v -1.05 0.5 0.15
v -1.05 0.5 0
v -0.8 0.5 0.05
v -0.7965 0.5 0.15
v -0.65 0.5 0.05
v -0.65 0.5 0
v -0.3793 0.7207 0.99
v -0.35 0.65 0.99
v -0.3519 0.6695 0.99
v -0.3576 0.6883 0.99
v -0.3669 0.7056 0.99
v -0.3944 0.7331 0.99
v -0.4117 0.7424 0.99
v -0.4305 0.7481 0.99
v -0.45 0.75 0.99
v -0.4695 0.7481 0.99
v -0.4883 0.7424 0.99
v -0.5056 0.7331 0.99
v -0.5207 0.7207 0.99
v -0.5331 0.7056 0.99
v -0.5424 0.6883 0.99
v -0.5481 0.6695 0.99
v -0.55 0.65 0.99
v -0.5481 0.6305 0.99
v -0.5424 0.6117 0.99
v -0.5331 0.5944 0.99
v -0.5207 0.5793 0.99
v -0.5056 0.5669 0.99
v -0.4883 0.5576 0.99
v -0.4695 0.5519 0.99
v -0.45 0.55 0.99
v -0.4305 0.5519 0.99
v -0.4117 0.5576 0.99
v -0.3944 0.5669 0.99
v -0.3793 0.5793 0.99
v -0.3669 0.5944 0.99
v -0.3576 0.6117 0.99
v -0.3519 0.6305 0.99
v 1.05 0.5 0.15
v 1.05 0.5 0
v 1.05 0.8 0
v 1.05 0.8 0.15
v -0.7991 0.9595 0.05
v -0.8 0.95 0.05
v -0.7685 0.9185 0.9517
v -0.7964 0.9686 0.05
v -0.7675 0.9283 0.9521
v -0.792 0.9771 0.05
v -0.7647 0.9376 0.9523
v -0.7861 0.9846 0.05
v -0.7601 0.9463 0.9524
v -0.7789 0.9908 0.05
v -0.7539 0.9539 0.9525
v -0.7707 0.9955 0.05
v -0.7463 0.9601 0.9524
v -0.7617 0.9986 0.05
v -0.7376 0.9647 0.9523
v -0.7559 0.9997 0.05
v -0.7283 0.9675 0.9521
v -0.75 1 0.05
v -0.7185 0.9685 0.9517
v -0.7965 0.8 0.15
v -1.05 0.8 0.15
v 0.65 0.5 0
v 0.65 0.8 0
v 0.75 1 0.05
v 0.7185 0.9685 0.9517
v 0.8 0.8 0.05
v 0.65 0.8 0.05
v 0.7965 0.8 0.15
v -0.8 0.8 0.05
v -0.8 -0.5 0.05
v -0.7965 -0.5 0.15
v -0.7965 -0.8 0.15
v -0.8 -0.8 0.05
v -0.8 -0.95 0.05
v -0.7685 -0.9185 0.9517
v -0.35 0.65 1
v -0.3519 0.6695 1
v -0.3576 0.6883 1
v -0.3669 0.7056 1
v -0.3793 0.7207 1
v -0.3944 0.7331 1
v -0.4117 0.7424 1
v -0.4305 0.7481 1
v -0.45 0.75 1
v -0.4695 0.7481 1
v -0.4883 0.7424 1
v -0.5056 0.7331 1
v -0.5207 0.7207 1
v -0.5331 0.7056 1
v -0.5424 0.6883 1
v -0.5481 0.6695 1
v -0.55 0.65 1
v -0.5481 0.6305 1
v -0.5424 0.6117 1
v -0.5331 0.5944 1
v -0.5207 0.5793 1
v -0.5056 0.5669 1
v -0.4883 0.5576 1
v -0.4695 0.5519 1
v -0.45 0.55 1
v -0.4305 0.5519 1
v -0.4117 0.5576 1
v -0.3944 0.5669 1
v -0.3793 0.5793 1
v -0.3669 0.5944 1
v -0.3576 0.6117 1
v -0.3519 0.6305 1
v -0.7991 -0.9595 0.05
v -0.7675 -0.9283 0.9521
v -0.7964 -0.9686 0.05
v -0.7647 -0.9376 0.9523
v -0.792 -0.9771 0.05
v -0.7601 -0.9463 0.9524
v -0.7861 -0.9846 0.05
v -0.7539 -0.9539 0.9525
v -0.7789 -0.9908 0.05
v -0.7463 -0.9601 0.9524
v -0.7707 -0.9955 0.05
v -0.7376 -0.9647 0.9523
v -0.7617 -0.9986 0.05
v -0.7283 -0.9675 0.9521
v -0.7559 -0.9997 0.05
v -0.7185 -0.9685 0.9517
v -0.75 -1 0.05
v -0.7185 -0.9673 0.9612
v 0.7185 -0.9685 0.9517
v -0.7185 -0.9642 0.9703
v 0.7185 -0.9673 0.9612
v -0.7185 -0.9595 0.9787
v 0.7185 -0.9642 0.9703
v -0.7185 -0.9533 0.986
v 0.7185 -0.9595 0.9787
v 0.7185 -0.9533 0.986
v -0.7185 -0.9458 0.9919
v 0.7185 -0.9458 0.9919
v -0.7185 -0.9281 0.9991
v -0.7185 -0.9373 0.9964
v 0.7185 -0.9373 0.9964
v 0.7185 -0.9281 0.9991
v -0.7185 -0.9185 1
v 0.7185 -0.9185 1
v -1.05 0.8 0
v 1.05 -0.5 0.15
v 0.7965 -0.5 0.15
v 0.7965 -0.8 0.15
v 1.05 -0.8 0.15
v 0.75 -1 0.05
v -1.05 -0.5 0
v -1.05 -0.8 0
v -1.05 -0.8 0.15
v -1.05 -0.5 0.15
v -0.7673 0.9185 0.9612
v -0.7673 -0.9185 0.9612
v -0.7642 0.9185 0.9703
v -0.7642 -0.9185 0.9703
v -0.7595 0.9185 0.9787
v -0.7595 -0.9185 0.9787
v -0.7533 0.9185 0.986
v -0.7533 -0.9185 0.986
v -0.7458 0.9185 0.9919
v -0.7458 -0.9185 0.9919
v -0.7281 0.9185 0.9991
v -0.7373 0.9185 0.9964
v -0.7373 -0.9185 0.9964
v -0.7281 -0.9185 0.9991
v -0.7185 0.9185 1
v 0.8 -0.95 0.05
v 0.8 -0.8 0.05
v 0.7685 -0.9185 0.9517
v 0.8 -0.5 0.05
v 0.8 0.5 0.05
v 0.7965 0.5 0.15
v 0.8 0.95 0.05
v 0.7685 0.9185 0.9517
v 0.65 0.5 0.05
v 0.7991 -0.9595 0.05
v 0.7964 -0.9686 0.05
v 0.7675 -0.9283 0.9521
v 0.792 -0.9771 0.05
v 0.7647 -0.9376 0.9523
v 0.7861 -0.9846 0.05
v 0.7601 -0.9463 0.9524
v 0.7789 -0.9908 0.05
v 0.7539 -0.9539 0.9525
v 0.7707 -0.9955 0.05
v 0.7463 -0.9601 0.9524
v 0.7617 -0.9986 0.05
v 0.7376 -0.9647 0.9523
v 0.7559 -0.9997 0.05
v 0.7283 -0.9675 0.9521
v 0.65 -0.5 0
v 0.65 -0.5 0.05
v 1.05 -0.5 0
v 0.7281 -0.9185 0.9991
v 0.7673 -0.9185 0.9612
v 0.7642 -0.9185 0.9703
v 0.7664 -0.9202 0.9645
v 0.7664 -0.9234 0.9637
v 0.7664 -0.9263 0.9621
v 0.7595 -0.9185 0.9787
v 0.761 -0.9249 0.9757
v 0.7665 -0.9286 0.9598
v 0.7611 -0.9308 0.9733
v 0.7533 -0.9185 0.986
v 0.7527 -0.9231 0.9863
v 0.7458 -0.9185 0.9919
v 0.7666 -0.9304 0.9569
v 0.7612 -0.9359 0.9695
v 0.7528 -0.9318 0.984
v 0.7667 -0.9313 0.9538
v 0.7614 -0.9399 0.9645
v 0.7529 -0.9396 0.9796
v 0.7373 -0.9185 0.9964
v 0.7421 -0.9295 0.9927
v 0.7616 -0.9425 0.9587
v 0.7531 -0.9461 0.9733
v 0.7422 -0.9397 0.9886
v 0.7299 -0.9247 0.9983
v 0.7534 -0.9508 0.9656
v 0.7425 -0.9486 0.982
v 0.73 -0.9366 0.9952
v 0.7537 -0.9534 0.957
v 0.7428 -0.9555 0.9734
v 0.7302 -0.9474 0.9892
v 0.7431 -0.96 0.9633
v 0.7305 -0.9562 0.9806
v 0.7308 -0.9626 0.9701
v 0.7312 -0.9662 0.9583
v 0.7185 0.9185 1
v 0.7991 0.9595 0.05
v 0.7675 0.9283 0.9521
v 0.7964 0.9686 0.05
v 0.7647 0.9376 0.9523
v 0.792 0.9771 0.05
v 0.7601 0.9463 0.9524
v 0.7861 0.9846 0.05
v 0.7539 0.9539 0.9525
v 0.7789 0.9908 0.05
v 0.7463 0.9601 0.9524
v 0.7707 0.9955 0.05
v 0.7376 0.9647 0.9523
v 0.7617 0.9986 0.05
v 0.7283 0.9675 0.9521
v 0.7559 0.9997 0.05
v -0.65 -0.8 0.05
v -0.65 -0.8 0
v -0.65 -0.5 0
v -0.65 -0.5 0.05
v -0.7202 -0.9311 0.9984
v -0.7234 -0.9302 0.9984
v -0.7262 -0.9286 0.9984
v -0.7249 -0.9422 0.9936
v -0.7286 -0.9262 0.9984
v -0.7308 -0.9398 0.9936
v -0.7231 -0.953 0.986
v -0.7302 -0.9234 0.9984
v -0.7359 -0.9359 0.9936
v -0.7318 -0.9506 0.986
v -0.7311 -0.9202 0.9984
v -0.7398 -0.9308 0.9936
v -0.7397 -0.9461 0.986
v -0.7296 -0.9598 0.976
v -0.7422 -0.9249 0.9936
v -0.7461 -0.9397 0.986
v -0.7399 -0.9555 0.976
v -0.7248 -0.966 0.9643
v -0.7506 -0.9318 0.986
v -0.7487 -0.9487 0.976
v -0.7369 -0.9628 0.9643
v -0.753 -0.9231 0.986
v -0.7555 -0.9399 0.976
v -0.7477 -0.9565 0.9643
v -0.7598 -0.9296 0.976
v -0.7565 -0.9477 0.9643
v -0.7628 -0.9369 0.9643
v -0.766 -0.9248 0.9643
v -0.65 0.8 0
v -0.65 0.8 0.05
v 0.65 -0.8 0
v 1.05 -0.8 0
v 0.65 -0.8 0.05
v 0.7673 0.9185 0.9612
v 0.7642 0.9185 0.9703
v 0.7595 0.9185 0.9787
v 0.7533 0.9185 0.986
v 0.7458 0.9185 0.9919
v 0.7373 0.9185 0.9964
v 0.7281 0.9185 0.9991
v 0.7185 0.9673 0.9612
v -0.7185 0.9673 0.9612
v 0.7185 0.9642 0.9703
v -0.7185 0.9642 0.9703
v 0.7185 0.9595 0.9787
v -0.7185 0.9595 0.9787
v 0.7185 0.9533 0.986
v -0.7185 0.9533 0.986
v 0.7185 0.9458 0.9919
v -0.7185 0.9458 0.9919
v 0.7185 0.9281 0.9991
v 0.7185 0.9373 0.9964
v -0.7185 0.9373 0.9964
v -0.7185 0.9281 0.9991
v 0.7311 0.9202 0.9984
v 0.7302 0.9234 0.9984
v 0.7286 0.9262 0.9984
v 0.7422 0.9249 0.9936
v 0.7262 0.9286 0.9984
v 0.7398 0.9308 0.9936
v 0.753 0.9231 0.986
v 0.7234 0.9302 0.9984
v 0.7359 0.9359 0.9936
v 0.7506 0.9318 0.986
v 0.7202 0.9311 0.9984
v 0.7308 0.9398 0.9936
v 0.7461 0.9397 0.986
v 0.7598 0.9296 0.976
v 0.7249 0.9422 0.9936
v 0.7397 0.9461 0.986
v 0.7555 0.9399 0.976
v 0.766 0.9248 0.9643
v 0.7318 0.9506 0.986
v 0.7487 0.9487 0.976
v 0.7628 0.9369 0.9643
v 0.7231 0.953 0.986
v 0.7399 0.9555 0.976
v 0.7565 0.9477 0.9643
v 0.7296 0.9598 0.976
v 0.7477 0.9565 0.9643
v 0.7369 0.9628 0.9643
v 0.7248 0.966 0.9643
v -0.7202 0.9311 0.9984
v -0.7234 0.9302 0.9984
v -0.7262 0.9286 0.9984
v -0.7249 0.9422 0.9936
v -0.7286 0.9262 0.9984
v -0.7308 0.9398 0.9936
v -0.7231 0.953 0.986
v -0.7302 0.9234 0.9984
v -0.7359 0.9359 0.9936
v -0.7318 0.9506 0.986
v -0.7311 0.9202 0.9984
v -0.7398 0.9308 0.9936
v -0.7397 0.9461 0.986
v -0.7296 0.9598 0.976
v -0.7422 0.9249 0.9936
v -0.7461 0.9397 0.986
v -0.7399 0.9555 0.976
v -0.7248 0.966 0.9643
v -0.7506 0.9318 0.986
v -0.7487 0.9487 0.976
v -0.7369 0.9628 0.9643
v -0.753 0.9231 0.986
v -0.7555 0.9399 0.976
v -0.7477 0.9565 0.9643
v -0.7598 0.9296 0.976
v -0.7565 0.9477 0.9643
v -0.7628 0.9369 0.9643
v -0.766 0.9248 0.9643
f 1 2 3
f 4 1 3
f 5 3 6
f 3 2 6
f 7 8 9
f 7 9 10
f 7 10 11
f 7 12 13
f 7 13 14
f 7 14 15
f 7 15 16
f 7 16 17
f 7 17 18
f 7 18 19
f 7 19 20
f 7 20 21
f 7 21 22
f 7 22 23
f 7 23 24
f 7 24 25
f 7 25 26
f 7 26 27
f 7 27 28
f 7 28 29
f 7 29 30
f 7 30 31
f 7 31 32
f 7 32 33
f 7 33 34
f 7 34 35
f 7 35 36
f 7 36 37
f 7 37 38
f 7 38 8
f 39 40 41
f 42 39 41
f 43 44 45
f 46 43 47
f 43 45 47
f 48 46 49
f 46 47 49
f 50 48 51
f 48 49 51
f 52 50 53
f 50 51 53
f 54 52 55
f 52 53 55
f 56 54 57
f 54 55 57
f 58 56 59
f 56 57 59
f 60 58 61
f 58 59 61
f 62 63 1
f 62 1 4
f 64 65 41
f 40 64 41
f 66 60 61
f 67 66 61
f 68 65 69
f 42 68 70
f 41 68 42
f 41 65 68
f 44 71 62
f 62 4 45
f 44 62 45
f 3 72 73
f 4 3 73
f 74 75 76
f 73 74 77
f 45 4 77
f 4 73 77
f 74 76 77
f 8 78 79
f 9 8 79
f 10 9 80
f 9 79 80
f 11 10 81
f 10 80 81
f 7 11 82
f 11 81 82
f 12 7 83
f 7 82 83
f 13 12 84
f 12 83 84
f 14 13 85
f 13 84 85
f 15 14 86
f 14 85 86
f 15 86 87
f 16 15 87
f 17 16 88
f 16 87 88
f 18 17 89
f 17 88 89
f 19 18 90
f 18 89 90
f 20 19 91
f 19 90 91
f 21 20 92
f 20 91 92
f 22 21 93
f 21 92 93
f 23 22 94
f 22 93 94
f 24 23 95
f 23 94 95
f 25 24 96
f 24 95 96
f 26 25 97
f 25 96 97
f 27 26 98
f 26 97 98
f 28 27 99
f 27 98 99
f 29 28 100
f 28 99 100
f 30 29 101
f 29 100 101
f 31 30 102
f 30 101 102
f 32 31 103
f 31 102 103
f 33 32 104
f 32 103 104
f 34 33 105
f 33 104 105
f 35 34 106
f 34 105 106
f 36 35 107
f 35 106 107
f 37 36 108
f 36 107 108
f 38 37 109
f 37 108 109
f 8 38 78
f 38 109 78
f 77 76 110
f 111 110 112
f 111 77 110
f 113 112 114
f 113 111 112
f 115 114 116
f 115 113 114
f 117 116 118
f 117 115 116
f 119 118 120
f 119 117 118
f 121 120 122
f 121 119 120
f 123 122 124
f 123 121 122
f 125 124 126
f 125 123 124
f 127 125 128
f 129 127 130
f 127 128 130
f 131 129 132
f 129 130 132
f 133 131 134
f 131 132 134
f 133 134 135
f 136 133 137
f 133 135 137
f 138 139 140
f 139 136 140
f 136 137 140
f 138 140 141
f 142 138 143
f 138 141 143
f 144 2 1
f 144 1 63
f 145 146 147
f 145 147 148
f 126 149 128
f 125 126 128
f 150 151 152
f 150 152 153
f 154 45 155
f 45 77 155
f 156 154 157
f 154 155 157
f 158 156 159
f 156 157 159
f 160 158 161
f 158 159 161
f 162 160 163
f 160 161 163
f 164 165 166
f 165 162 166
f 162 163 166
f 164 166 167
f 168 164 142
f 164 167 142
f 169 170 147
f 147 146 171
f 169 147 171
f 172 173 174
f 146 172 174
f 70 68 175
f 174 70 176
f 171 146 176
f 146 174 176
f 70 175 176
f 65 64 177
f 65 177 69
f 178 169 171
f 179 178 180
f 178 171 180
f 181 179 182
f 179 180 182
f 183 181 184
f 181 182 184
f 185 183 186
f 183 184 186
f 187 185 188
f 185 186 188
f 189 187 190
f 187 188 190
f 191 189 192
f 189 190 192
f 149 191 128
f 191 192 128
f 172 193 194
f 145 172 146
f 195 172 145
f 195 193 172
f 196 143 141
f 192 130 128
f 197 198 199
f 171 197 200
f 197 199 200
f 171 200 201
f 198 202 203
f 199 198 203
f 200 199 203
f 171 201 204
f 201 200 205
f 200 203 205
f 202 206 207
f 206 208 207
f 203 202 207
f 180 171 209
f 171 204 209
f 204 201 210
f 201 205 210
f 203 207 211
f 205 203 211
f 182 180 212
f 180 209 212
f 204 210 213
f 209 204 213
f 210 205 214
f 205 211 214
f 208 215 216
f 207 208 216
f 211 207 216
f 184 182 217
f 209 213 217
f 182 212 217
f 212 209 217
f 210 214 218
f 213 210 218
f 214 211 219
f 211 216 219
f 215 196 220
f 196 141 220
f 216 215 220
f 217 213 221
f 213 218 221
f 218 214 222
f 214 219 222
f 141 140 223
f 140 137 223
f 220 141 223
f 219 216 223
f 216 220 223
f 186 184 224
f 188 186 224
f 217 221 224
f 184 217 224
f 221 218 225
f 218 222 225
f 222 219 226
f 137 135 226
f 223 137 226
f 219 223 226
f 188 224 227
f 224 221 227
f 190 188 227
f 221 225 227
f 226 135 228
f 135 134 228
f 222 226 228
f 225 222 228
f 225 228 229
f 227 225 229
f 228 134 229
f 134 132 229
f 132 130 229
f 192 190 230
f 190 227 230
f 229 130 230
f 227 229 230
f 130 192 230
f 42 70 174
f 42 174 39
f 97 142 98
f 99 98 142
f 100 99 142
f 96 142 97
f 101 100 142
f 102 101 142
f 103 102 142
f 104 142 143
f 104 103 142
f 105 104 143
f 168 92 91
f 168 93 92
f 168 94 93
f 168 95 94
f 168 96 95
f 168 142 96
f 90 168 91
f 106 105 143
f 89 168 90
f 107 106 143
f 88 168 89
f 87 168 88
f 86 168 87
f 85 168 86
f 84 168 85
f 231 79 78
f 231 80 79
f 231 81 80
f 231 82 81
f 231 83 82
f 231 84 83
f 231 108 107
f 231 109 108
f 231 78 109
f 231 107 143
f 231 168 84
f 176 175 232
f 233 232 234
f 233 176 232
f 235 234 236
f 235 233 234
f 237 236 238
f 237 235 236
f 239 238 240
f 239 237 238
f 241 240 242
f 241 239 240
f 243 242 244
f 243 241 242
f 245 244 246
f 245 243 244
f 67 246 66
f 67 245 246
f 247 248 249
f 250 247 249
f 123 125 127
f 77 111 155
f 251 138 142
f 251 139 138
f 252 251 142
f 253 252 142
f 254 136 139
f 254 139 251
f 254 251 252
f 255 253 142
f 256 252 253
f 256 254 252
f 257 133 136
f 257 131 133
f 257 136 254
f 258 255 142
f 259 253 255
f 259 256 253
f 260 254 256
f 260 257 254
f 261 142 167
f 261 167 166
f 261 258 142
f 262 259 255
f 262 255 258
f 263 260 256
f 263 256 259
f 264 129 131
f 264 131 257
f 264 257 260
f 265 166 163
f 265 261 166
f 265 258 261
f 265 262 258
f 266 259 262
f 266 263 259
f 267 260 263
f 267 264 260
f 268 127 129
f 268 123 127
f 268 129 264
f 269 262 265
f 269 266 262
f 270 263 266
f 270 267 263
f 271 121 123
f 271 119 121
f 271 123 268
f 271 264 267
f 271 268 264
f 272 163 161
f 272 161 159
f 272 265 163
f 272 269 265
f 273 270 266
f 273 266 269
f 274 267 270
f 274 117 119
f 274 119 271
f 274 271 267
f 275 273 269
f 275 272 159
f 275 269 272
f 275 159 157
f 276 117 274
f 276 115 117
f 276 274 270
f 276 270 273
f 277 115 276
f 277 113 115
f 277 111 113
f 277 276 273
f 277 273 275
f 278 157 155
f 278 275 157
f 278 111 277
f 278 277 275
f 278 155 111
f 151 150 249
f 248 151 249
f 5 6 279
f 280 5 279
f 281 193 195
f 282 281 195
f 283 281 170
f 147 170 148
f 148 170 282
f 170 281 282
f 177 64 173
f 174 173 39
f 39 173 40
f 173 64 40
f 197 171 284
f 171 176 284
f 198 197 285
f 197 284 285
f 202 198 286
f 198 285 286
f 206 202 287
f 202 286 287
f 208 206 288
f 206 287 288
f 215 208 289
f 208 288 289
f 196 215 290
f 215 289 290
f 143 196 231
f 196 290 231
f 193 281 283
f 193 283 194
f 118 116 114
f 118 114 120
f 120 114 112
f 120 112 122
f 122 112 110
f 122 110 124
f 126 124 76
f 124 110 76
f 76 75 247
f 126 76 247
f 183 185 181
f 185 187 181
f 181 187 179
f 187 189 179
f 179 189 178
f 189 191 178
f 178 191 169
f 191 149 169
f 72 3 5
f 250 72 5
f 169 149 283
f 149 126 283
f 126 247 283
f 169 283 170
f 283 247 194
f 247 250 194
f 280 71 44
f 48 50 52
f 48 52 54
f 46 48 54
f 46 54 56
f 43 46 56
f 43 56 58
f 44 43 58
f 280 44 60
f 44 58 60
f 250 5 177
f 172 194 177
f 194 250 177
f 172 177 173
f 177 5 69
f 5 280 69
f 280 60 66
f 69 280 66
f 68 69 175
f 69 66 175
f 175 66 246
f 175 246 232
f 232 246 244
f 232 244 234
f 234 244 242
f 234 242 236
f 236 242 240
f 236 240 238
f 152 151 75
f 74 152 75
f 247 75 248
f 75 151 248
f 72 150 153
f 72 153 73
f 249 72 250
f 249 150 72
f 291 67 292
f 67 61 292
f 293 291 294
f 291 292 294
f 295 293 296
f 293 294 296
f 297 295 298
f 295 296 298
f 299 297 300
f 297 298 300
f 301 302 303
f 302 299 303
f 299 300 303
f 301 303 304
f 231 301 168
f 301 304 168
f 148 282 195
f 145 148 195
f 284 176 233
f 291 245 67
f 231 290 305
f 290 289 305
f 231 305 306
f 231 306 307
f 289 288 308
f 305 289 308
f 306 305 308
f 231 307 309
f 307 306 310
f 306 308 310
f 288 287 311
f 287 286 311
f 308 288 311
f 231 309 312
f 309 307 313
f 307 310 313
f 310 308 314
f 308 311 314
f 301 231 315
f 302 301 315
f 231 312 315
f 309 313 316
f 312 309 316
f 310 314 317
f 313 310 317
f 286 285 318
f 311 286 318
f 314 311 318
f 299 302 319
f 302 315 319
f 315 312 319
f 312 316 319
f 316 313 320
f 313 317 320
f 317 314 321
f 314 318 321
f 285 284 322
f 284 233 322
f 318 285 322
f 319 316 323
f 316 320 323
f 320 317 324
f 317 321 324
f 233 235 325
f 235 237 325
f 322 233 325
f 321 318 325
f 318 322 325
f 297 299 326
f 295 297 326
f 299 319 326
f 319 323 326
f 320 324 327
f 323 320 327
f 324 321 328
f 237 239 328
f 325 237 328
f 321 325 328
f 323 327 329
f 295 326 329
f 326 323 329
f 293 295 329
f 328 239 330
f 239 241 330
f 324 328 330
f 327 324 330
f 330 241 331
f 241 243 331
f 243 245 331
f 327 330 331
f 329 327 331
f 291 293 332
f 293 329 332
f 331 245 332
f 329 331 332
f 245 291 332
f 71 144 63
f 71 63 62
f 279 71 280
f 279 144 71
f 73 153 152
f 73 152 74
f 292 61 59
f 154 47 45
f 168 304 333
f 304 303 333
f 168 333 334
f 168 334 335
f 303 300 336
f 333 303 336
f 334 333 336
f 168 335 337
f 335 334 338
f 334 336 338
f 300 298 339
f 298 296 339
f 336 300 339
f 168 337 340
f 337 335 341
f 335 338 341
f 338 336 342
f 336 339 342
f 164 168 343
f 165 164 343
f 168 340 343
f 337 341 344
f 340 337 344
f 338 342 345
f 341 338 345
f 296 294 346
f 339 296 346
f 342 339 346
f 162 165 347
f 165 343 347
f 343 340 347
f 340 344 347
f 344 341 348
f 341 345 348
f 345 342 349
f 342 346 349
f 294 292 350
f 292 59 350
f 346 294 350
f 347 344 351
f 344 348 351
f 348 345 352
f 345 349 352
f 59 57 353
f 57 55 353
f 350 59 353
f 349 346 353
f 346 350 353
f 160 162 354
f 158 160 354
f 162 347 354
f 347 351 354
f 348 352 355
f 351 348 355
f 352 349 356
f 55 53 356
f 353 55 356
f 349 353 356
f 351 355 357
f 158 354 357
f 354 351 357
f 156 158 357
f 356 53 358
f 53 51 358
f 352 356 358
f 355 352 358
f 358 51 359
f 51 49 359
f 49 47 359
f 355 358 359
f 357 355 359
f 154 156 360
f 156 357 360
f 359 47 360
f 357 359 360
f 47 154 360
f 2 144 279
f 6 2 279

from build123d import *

# Parameters (mm, degrees)
SKETCH_1_W          = 1.6
SKETCH_1_H          = 2
EXTRUDE_1_DEPTH     = 0.95
EXTRUDE_1_TAPER     = 2
SKETCH_2_W          = 0.4
SKETCH_2_H          = 0.3
EXTRUDE_2_DEPTH     = 0.15
FILLET_1_R          = 0.05
SKETCH_3_R          = 0.1
CUT_EXTRUDE_1_DEPTH = 0.01


with BuildPart() as part:
    # Эскиз1 → Бобышка-Вытянуть1 (new body)
    with BuildSketch(Plane.XY.offset(0.05)):
        Rectangle(SKETCH_1_W, SKETCH_1_H)
    extrude(amount=EXTRUDE_1_DEPTH, taper=EXTRUDE_1_TAPER)

    # Эскиз2 → Бобышка-Вытянуть2 (add)
    with BuildSketch(Plane.XY):
        with Locations((0.85, 0.65)):
            Rectangle(SKETCH_2_W, SKETCH_2_H)
        with Locations((0.85, -0.65)):
            Rectangle(SKETCH_2_W, SKETCH_2_H)
        with Locations((-0.85, 0.65)):
            Rectangle(SKETCH_2_W, SKETCH_2_H)
        with Locations((-0.85, -0.65)):
            Rectangle(SKETCH_2_W, SKETCH_2_H)
    extrude(amount=EXTRUDE_2_DEPTH)

    # Скругление1
    fillet_1_edges = [part.edges().sort_by_distance(p)[0] for p in [
        (0.783412634, 0.983412634, 0.525),
        (-0.783412173, 0.983412173, 0.525013228),
        (-0.783412634, -0.983412634, 0.525),
        (0, -0.966825269, 1),
        (0.766825269, 0, 1),
        (0, 0.966825269, 1),
        (-0.766825269, 0, 1),
        (0.783412634, -0.983412634, 0.525),
    ]]
    fillet(fillet_1_edges, radius=FILLET_1_R)

    # Эскиз3 → Вырез-Вытянуть1 (cut)
    with BuildSketch(Plane.XY.offset(1)):
        with Locations((-0.45, 0.65)):
            Circle(SKETCH_3_R)
    extrude(amount=-CUT_EXTRUDE_1_DEPTH, mode=Mode.SUBTRACT)


solid = part.part
